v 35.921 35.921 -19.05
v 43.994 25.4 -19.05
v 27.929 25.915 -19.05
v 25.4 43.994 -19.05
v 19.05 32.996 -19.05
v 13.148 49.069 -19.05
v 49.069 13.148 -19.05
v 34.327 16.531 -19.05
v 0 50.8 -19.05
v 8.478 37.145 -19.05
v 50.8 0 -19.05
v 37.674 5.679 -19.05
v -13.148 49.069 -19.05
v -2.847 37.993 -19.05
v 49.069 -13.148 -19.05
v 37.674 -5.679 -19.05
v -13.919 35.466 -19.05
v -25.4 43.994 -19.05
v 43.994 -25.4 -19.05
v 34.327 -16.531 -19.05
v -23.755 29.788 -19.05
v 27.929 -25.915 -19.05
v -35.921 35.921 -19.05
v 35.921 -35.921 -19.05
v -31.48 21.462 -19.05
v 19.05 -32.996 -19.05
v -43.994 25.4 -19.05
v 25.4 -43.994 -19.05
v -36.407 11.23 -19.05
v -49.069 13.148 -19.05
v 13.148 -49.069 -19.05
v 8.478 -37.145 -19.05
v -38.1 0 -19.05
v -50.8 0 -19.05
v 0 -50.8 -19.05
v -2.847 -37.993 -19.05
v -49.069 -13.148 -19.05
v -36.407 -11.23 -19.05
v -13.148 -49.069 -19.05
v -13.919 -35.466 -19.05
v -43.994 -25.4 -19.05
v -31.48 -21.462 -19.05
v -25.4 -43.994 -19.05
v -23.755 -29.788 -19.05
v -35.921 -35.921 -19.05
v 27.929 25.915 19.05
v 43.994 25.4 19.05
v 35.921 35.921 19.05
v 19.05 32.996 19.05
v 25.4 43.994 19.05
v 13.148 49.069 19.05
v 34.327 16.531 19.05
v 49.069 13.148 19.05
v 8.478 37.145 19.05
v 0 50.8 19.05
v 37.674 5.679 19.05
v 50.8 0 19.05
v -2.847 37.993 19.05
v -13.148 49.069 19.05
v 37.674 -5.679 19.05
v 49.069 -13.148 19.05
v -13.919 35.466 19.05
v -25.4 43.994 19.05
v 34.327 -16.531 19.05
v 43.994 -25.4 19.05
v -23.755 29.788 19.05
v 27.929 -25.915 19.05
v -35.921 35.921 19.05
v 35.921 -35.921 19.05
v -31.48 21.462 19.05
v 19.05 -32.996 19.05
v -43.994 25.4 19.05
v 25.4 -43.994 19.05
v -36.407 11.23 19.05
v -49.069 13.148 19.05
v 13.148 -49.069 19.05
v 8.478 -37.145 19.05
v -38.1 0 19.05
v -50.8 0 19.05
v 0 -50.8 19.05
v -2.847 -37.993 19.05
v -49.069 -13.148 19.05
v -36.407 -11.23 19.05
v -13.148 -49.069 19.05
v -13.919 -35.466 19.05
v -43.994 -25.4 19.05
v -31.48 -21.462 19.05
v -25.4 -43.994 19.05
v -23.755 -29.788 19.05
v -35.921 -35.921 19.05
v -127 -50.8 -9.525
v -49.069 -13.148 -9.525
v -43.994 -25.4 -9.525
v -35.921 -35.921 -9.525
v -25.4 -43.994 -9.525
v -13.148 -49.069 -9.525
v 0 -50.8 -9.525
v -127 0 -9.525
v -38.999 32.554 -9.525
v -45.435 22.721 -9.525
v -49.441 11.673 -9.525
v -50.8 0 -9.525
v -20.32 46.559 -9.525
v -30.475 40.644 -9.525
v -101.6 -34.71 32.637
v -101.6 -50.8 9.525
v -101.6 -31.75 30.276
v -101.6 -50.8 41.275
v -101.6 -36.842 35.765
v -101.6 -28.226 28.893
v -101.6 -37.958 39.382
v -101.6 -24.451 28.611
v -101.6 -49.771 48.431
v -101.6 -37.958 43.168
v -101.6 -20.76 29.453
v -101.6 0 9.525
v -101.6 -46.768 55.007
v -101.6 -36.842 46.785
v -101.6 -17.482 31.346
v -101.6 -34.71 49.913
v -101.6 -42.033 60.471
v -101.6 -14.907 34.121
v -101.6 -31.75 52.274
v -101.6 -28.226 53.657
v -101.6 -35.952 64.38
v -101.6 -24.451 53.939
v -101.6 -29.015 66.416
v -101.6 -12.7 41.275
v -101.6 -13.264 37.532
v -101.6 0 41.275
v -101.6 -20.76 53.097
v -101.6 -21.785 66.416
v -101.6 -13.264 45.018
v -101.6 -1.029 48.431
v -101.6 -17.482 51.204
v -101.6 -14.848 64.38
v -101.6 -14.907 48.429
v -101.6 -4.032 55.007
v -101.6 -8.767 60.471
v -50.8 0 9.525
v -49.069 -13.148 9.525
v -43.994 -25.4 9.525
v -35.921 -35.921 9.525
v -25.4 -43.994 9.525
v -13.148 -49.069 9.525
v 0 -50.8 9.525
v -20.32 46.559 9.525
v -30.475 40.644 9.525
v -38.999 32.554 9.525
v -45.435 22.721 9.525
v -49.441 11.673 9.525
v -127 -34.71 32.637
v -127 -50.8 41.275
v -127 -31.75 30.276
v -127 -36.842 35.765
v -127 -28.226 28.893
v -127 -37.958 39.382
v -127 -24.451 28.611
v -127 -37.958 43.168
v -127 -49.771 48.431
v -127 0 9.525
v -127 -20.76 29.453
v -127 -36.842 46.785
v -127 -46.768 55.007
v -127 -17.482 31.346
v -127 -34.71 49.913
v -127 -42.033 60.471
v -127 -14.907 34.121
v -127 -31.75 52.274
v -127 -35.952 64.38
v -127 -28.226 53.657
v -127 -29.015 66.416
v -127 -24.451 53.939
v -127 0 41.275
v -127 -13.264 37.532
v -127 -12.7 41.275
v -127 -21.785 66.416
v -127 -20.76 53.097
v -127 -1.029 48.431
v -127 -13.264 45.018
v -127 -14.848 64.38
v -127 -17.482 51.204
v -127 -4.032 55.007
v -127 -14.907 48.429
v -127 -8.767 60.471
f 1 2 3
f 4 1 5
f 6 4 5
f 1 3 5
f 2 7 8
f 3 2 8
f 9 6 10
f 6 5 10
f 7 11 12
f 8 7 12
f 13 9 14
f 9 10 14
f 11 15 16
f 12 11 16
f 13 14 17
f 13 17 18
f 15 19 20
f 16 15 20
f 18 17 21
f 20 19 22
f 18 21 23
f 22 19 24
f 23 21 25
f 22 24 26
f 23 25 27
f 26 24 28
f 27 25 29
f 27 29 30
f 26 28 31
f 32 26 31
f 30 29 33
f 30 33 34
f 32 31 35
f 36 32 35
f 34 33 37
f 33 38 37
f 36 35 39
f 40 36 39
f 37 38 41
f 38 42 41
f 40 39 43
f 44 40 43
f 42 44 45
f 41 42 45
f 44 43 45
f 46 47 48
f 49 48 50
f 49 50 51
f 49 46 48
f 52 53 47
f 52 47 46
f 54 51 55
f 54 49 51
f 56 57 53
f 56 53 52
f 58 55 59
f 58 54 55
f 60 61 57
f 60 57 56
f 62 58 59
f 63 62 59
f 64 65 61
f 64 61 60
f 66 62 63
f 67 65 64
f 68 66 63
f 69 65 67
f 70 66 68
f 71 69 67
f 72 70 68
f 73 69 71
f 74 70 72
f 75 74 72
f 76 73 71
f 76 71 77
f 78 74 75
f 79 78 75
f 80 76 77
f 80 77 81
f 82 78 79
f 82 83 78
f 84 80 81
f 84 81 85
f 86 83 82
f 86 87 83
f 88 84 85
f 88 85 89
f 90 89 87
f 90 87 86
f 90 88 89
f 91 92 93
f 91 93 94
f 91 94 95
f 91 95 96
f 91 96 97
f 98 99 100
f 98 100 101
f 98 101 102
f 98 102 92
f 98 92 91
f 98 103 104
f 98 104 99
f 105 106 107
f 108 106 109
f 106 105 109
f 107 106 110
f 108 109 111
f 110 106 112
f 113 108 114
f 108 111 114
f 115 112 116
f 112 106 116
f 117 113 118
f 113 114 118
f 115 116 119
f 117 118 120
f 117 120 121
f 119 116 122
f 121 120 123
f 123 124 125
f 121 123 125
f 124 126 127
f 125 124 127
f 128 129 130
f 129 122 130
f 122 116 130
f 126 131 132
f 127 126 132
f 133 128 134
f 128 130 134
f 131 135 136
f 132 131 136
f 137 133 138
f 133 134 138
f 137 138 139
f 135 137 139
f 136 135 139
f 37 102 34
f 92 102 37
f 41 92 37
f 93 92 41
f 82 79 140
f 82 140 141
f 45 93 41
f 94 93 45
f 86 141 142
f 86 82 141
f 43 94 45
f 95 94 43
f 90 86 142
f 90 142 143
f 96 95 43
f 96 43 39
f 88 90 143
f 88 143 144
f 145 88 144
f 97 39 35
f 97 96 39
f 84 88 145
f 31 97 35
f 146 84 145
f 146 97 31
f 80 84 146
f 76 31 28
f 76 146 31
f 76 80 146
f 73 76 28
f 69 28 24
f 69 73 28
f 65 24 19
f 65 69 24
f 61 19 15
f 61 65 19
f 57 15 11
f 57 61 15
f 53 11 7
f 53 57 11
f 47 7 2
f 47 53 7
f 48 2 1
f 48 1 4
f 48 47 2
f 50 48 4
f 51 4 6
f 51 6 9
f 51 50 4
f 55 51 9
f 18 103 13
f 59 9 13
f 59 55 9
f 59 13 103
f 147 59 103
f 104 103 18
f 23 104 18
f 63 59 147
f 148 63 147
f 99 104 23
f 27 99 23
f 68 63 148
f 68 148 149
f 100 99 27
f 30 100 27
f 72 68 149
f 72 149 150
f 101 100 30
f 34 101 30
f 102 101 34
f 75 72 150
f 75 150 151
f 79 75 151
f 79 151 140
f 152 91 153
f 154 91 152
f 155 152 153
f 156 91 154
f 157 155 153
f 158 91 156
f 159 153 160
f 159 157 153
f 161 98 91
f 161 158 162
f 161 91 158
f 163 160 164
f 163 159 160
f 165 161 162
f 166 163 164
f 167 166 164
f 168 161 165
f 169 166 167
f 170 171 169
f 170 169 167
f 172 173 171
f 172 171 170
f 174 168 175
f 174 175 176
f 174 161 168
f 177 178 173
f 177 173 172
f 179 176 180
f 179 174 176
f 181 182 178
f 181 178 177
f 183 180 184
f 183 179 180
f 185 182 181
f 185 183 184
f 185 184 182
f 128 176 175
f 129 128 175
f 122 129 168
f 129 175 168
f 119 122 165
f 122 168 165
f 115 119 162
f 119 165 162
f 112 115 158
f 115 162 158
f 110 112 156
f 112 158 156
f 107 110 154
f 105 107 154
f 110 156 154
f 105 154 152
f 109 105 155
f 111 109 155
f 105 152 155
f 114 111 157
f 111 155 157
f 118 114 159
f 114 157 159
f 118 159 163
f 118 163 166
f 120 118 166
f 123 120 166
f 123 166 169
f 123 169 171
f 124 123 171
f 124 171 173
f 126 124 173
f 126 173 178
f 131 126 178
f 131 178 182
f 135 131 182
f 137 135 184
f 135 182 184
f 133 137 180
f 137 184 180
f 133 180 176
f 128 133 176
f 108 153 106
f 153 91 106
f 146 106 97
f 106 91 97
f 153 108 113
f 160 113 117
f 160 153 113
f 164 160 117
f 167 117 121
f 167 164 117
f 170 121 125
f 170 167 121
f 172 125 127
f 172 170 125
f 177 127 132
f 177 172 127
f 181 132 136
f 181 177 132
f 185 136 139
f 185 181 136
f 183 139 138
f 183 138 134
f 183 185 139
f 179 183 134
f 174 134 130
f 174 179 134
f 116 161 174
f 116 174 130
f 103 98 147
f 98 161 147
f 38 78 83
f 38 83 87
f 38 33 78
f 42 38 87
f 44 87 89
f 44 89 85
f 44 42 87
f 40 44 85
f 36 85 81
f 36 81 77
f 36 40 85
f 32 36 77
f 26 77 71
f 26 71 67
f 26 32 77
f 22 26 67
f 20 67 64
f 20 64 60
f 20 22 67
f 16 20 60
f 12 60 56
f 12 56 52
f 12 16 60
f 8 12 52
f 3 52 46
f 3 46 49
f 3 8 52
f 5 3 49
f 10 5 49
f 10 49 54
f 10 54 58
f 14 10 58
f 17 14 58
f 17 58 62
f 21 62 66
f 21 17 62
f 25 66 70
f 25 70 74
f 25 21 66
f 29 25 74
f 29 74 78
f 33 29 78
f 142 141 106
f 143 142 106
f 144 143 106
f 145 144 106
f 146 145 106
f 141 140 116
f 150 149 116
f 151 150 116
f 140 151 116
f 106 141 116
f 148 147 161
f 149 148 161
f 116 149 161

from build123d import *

# Parameters (mm, degrees)
SKETCH1_R           = 50.8
SKETCH1_R_2         = 38.1
BOSS_EXTRUDE1_DEPTH = 19.05
BOSS_EXTRUDE2_DEPTH = 9.525
SKETCH3_W           = 25.4
SKETCH3_H           = 50.8
BOSS_EXTRUDE3_DEPTH = 31.75
SKETCH4_R           = 25.4
SKETCH4_R_2         = 12.7
BOSS_EXTRUDE5_DEPTH = 25.4
SKETCH5_R           = 12.7
CUT_EXTRUDE1_DEPTH  = 197.56814499


with BuildPart() as part:
    # Sketch1 → Boss-Extrude1 (new, symmetric)
    with BuildSketch(Plane.XY):
        with Locations(Location((0, 0, 0), (0, 0, 180))):
            Circle(SKETCH1_R)
        with Locations(Location((0, 0, 0), (0, 0, 180))):
            Circle(SKETCH1_R_2, mode=Mode.SUBTRACT)
    extrude(amount=BOSS_EXTRUDE1_DEPTH, both=True)

    # Sketch2 → Boss-Extrude2 (add, symmetric)
    with BuildSketch(Plane.XY):
        with BuildLine():
            Line((0, -50.8), (-127, -50.8))
            Line((-127, -50.8), (-127, 0))
            Line((-127, 0), (-20.32, 46.558969061))
            ThreePointArc((-20.32, 46.558969061), (-49.728440697, -10.378929899), (0, -50.8))
        make_face()
    extrude(amount=BOSS_EXTRUDE2_DEPTH, both=True)

    # Sketch3 → Boss-Extrude3 (add)
    with BuildSketch(Plane.XY.offset(9.525)):
        with Locations((-114.3, -25.4)):
            Rectangle(SKETCH3_W, SKETCH3_H)
    extrude(amount=BOSS_EXTRUDE3_DEPTH)

    # Sketch4 → Boss-Extrude5 (add)
    with BuildSketch(Plane.ZY.offset(127)):
        with Locations((41.275, -25.4)):
            Circle(SKETCH4_R)
        with Locations((41.275, -25.4)):
            Circle(SKETCH4_R_2, mode=Mode.SUBTRACT)
    extrude(amount=-BOSS_EXTRUDE5_DEPTH)

    # Sketch5 → Cut-Extrude1 (cut, through all)
    with BuildSketch(Plane.ZY.offset(127)):
        with Locations((41.275, -25.4)):
            Circle(SKETCH5_R)
    extrude(amount=-CUT_EXTRUDE1_DEPTH, mode=Mode.SUBTRACT)


solid = part.part
